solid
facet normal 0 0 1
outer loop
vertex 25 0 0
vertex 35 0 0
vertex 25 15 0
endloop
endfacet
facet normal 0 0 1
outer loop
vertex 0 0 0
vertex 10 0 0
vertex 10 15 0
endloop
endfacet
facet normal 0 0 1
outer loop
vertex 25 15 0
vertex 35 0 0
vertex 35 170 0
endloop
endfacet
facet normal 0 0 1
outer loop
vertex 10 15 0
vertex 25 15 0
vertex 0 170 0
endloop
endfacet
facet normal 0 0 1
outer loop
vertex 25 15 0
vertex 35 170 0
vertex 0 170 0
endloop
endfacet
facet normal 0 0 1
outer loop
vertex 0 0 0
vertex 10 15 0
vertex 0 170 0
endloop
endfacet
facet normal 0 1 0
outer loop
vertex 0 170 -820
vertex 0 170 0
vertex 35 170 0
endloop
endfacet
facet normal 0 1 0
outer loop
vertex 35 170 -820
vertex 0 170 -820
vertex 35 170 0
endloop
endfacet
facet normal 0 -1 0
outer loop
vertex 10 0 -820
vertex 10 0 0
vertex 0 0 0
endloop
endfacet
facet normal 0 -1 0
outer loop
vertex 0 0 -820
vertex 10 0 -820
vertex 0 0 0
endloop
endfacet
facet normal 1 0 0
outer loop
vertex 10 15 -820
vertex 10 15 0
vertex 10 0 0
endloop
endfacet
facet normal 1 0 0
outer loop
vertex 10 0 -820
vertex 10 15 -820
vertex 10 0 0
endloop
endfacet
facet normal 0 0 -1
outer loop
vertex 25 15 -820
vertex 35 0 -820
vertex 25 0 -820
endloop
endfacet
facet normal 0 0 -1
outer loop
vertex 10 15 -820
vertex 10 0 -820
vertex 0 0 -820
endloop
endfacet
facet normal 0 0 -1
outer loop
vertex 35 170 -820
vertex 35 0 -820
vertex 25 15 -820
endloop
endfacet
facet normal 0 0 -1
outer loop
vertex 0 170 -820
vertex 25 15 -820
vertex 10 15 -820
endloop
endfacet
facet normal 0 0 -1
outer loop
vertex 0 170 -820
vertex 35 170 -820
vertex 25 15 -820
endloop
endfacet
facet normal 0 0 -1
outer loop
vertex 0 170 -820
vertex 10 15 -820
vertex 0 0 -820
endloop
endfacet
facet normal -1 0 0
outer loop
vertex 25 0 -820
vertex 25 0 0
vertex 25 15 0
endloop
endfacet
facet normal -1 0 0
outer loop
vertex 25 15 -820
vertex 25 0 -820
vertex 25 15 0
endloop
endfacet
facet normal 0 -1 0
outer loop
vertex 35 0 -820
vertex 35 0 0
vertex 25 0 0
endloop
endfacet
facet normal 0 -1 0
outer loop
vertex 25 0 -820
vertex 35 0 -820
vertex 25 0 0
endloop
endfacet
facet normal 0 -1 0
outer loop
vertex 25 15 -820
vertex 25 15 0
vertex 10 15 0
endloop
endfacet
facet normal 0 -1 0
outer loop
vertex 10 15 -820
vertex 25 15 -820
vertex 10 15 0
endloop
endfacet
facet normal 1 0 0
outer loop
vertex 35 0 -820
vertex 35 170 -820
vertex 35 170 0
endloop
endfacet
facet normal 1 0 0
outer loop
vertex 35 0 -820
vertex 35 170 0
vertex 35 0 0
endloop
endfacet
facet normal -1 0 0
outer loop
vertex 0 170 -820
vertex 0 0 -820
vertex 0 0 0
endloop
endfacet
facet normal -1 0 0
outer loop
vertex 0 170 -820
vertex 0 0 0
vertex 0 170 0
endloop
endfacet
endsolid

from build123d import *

# Parameters (mm, degrees)
EXTRUDE_1_DEPTH = 820


with BuildPart() as part:
    # Эскиз1 → Бобышка-Вытянуть1 (new body)
    with BuildSketch(Plane.XY):
        Polygon((0, 0), (0, 170), (35, 170), (35, 0), (25, 0), (25, 15), (10, 15), (10, 0), align=None)
    extrude(amount=-EXTRUDE_1_DEPTH)


solid = part.part
